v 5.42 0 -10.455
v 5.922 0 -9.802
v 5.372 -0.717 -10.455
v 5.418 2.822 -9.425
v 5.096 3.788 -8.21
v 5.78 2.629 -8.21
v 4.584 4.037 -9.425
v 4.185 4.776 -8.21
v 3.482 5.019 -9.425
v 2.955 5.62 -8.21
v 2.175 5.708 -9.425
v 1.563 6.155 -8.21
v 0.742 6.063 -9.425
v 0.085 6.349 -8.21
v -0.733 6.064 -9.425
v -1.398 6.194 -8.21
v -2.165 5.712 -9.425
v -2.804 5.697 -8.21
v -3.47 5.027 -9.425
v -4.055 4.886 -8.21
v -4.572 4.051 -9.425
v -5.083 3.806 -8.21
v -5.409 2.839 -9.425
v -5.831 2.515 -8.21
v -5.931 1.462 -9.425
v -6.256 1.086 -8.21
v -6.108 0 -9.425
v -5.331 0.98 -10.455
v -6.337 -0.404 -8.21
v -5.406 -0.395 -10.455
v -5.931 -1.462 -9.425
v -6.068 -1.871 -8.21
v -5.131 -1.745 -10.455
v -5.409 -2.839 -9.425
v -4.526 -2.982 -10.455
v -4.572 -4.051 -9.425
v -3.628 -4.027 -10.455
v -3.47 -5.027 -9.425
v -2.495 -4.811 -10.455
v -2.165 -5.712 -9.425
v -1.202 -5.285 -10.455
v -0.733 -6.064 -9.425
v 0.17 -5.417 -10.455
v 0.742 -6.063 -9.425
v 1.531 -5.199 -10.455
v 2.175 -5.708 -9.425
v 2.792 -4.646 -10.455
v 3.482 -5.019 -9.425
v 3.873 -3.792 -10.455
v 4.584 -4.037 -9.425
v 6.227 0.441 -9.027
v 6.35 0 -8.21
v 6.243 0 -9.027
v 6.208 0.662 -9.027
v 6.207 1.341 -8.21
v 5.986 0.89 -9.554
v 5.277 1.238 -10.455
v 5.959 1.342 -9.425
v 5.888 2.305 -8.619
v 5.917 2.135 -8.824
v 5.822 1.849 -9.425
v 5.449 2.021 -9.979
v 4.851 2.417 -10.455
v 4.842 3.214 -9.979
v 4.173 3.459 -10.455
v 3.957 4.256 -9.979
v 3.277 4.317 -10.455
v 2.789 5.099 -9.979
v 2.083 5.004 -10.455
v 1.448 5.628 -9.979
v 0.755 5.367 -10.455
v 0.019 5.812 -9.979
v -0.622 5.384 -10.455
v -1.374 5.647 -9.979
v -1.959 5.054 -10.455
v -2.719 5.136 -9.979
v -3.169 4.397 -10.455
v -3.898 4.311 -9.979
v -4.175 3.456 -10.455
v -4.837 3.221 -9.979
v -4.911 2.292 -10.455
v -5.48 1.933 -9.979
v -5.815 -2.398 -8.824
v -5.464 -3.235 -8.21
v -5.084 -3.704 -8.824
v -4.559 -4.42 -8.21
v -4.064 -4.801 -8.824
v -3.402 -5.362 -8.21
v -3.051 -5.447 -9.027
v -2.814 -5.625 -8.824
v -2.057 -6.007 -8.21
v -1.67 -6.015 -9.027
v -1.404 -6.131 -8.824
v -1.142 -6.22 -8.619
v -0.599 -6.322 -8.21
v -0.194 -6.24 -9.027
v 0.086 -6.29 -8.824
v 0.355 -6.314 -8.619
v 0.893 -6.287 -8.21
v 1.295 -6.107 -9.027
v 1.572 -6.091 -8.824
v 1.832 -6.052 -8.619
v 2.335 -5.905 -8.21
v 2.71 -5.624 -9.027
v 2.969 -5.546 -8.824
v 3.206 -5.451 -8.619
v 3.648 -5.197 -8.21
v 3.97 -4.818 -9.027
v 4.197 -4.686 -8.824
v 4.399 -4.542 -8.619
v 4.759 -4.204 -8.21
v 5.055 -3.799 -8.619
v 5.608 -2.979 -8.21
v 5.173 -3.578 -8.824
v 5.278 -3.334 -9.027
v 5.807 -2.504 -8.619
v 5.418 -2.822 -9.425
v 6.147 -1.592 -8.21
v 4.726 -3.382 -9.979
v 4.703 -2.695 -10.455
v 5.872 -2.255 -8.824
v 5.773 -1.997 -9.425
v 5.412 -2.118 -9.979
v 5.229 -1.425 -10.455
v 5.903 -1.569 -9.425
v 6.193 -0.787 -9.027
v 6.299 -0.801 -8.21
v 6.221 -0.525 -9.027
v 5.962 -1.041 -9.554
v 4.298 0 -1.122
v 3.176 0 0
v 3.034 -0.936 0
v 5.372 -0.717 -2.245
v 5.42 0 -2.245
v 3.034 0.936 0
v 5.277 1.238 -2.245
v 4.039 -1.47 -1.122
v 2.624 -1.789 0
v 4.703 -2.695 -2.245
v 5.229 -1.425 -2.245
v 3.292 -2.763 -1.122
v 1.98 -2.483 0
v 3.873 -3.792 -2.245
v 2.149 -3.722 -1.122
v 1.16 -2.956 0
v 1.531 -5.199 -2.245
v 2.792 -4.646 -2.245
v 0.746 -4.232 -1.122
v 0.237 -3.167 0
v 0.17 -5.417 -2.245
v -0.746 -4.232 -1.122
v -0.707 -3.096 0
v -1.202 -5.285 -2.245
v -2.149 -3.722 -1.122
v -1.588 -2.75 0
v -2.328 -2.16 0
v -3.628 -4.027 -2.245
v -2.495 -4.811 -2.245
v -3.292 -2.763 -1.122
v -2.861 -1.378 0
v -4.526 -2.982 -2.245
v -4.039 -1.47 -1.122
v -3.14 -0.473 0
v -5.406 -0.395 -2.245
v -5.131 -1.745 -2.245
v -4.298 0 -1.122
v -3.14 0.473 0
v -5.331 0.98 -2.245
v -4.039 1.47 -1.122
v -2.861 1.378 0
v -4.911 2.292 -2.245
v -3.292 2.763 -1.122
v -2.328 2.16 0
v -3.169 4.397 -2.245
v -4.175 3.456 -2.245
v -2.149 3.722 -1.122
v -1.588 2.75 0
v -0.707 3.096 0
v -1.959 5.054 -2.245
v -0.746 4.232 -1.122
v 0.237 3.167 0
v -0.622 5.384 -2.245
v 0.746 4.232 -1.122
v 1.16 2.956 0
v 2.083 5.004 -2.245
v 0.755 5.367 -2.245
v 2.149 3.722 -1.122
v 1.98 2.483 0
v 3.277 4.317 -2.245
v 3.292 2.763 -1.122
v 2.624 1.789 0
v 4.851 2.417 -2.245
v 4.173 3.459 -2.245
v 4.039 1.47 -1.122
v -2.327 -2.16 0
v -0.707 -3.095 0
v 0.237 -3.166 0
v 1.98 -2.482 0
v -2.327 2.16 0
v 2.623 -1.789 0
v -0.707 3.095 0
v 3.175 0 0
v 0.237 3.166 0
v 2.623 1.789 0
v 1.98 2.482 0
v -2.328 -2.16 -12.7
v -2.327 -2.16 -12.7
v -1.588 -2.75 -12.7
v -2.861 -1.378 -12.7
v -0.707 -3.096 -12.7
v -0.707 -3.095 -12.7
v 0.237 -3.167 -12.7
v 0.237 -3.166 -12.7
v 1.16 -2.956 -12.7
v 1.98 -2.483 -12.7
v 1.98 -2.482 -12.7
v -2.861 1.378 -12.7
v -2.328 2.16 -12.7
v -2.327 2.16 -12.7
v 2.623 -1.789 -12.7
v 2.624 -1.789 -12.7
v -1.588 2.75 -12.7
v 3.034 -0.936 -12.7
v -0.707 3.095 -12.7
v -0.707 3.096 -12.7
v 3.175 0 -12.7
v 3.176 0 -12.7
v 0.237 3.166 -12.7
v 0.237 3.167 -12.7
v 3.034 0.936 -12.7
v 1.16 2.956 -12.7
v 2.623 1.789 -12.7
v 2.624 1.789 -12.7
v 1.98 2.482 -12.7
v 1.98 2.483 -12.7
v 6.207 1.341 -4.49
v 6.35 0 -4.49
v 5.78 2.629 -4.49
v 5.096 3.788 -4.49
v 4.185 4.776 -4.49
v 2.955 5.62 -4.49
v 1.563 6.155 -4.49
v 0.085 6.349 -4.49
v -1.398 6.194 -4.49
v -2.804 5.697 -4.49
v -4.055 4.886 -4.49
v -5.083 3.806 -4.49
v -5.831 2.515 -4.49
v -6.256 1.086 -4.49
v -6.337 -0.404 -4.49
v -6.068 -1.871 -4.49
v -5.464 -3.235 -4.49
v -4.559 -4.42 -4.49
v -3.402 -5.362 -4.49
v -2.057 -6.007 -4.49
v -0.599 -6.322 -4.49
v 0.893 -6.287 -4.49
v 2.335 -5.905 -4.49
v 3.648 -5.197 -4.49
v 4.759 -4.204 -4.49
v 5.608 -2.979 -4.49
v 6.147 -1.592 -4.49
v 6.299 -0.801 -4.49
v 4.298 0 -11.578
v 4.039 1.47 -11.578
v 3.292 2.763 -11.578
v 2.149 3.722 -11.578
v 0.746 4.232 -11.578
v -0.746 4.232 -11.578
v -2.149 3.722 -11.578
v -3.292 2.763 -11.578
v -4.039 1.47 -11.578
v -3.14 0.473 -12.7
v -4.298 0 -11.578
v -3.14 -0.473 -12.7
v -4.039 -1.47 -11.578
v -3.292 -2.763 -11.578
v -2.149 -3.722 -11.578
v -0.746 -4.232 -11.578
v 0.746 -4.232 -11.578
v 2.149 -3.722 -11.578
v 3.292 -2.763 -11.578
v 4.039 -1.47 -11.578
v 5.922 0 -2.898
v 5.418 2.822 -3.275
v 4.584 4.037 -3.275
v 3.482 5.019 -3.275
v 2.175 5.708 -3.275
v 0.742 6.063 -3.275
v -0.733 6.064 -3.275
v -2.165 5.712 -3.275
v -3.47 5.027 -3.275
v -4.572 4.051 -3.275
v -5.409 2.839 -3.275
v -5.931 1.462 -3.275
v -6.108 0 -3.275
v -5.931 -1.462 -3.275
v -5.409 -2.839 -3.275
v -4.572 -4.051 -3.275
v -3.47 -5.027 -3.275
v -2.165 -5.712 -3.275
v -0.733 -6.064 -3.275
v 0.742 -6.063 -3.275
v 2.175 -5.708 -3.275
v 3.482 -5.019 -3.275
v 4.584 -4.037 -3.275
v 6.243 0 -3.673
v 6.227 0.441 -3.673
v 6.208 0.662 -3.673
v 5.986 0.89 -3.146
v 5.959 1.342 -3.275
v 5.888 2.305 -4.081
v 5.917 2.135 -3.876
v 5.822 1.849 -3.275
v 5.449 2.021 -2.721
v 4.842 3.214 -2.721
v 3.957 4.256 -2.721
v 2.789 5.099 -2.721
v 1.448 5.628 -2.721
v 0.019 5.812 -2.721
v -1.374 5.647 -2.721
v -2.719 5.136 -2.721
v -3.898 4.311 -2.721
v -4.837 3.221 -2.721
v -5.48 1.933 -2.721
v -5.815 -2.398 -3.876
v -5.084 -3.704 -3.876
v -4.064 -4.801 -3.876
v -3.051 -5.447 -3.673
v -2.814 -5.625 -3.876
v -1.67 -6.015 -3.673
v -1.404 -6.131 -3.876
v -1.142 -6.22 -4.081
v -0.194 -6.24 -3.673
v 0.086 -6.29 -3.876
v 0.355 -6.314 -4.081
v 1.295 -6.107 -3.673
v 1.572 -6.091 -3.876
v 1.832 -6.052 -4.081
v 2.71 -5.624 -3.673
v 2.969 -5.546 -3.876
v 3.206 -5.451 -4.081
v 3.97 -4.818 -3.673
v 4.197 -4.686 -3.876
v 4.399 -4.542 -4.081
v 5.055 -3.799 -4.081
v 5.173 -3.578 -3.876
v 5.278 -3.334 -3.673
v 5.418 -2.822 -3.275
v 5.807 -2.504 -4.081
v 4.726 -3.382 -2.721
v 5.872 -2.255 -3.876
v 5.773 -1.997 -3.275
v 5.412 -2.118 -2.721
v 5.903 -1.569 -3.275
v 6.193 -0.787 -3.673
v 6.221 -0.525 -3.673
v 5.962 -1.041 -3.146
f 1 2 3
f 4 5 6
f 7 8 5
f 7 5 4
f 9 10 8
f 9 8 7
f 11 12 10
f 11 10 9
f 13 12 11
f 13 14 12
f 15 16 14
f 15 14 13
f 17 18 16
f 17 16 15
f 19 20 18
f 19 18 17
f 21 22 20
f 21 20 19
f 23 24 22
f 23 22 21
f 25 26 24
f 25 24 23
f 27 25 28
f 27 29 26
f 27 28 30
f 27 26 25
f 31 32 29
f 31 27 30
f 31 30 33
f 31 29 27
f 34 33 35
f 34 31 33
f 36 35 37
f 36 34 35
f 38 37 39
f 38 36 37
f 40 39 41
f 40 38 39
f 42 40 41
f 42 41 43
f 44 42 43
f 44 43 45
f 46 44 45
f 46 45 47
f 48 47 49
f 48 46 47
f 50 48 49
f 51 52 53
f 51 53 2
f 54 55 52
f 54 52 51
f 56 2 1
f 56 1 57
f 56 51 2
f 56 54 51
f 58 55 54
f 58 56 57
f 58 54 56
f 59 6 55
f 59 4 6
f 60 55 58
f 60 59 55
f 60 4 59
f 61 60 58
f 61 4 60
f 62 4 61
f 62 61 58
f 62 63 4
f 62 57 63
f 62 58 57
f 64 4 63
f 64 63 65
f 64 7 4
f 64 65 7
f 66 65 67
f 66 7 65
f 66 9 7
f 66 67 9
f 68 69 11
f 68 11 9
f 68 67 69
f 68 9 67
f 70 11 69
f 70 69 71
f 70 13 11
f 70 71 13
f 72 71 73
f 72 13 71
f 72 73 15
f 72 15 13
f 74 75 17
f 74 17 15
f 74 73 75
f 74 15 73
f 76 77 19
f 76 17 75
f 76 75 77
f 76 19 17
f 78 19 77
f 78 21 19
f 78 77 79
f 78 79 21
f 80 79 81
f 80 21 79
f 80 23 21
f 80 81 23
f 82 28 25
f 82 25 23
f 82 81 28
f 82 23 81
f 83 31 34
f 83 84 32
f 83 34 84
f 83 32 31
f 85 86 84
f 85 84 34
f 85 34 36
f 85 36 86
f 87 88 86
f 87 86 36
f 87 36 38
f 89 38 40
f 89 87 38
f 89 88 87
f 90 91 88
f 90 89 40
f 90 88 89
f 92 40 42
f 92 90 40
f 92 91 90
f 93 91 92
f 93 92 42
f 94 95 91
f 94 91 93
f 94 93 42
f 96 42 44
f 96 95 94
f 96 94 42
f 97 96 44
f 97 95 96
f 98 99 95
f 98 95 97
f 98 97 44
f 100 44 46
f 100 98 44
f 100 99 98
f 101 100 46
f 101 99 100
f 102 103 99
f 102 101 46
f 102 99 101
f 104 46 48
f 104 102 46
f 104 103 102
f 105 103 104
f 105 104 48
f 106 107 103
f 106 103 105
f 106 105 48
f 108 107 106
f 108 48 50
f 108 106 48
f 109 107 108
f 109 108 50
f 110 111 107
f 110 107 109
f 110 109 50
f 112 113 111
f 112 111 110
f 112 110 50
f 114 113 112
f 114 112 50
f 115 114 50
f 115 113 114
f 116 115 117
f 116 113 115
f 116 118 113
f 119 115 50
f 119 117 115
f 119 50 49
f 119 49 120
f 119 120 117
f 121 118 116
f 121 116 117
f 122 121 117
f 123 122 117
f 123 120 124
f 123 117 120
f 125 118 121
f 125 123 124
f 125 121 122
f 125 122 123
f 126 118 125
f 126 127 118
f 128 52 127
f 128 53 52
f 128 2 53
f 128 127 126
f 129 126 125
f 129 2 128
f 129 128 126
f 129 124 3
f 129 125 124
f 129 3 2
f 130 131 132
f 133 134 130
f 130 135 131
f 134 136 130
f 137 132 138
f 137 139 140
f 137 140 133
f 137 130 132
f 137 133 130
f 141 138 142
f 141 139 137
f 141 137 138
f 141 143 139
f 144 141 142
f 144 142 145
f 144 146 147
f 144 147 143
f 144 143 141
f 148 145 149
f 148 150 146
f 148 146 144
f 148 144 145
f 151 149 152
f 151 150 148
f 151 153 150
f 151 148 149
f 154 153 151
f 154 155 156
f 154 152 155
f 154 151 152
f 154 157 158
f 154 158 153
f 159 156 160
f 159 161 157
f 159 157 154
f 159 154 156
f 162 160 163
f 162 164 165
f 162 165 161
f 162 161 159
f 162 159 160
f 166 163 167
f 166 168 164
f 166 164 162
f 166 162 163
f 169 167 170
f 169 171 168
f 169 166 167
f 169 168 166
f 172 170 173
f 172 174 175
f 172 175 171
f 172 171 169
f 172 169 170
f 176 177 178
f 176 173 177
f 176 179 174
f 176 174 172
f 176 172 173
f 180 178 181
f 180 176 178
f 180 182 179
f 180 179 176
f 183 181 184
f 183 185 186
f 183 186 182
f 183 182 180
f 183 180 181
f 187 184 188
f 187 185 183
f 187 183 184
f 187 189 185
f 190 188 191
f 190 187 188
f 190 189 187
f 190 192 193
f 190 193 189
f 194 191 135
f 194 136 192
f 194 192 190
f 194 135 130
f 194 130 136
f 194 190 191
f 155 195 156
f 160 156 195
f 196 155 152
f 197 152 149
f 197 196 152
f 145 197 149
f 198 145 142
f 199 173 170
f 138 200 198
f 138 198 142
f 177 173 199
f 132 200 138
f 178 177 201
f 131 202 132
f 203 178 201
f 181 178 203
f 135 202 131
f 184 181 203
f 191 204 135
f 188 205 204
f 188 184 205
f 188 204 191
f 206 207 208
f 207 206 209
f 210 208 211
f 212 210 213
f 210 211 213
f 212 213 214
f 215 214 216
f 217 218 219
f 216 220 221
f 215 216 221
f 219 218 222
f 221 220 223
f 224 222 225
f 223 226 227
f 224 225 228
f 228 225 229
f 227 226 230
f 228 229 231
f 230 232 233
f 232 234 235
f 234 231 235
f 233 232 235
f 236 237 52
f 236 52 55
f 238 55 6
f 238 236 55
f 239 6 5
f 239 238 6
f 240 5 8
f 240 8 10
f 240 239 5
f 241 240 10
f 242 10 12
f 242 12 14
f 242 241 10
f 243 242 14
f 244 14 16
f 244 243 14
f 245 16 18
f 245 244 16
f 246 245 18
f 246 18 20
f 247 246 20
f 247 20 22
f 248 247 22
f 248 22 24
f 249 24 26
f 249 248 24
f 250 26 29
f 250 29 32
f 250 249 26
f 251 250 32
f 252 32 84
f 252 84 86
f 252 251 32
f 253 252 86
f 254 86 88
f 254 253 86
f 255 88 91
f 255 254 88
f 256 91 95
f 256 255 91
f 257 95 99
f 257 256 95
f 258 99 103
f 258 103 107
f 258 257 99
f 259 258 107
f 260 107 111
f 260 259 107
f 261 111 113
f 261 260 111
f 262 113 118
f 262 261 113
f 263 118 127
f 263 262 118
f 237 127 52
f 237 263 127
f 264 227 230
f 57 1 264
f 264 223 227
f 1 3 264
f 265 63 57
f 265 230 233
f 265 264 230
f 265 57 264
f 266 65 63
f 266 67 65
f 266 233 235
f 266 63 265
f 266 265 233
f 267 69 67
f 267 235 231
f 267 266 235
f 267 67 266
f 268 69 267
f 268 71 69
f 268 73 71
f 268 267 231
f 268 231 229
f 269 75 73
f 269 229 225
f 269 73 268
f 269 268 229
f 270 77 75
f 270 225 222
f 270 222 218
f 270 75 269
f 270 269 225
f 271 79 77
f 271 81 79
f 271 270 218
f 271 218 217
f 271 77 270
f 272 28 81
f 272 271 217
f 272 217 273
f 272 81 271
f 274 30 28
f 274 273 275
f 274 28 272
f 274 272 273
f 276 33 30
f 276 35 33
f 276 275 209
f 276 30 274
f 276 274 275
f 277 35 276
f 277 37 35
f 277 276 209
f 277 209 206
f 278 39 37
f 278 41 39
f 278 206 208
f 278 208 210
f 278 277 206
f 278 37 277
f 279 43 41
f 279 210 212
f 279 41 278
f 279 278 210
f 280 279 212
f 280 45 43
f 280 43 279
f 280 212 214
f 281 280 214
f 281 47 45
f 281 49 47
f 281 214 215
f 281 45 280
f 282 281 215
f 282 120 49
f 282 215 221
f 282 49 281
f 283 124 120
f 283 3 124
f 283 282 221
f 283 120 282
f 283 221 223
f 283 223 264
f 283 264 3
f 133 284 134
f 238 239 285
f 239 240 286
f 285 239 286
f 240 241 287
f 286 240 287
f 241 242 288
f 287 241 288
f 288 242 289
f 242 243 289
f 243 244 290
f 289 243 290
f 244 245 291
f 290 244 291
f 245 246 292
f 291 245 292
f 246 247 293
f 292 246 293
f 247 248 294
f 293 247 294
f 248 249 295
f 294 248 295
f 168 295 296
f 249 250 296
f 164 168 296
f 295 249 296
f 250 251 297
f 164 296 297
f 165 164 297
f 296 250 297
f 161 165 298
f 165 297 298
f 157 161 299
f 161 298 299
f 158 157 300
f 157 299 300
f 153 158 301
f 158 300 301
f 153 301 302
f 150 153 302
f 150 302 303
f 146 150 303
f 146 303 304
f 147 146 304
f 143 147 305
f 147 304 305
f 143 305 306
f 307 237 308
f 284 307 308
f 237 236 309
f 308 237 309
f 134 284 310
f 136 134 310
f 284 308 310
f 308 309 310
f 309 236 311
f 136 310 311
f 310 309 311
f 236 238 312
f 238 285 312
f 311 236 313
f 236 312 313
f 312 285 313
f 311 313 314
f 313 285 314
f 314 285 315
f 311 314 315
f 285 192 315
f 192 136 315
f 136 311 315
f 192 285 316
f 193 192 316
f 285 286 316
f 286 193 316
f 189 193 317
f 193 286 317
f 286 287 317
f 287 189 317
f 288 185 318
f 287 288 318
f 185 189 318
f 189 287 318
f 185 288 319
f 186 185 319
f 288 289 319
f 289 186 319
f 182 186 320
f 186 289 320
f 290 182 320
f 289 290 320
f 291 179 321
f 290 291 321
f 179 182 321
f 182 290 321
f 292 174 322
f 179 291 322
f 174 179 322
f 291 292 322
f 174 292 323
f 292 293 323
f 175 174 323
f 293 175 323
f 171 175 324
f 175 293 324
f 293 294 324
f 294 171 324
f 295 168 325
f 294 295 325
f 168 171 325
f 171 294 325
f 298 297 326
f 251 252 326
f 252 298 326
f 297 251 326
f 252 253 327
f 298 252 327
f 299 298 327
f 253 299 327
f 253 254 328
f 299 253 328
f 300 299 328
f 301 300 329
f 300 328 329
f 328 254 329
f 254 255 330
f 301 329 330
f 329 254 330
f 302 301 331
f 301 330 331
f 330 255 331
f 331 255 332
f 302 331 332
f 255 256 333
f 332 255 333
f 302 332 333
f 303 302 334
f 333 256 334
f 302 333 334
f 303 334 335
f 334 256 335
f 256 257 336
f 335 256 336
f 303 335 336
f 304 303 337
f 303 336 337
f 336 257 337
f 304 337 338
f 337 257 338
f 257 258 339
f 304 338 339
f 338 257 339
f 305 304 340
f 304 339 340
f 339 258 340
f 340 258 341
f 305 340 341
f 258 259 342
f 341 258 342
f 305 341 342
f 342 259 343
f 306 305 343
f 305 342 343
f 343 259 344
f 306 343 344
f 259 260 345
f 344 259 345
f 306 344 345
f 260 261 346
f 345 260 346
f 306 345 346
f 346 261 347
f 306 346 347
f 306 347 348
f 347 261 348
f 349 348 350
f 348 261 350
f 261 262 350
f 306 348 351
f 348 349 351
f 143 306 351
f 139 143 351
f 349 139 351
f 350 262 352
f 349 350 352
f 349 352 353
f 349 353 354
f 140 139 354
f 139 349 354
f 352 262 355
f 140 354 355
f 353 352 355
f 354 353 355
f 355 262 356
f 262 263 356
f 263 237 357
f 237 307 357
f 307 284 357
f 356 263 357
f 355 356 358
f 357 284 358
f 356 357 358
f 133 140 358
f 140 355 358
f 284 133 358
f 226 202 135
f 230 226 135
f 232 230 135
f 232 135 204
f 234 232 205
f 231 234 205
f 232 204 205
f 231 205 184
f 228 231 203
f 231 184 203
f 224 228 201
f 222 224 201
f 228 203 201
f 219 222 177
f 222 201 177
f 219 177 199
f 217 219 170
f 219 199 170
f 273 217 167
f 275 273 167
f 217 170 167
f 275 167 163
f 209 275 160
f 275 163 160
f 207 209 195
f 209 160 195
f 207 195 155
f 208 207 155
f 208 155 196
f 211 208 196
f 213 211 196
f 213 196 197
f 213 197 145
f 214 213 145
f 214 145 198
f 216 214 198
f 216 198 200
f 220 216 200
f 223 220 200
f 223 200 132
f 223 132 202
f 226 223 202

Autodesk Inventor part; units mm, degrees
ref_plane "YZ Plane" through (0, 0, 0) normal (1, 0, 0) x (0, 1, 0)
ref_plane "XZ Plane" through (0, 0, 0) normal (0, 1, 0) x (-1, 0, 0)
ref_plane "XY Plane" through (0, 0, 0) normal (0, 0, 1) x (1, 0, 0)
sketch "Sketch1" plane through (0, 0, 0) normal (0, 0, 1) x (1, 0, 0)
  circle A0 centre (0, 0) radius 3.175
  circle A1 centre (0, 0) radius 6.35
  dimension "d0" = 6.35
  dimension "d1" = 12.7
extrude "Extrusion1" add sketch "Sketch1" against normal blind 12.7
chamfer "Chamfer1" distance 3.175 angle 45 2 edges at (-6.35, 0, 0) (-6.35, 0, -12.7)
fillet "Fillet1" radius 3.175 2 edges at (-6.35, 0, -3.1745) (-6.35, 0, -9.5255)
properties part number "Handle" material "Aluminum 6061"
